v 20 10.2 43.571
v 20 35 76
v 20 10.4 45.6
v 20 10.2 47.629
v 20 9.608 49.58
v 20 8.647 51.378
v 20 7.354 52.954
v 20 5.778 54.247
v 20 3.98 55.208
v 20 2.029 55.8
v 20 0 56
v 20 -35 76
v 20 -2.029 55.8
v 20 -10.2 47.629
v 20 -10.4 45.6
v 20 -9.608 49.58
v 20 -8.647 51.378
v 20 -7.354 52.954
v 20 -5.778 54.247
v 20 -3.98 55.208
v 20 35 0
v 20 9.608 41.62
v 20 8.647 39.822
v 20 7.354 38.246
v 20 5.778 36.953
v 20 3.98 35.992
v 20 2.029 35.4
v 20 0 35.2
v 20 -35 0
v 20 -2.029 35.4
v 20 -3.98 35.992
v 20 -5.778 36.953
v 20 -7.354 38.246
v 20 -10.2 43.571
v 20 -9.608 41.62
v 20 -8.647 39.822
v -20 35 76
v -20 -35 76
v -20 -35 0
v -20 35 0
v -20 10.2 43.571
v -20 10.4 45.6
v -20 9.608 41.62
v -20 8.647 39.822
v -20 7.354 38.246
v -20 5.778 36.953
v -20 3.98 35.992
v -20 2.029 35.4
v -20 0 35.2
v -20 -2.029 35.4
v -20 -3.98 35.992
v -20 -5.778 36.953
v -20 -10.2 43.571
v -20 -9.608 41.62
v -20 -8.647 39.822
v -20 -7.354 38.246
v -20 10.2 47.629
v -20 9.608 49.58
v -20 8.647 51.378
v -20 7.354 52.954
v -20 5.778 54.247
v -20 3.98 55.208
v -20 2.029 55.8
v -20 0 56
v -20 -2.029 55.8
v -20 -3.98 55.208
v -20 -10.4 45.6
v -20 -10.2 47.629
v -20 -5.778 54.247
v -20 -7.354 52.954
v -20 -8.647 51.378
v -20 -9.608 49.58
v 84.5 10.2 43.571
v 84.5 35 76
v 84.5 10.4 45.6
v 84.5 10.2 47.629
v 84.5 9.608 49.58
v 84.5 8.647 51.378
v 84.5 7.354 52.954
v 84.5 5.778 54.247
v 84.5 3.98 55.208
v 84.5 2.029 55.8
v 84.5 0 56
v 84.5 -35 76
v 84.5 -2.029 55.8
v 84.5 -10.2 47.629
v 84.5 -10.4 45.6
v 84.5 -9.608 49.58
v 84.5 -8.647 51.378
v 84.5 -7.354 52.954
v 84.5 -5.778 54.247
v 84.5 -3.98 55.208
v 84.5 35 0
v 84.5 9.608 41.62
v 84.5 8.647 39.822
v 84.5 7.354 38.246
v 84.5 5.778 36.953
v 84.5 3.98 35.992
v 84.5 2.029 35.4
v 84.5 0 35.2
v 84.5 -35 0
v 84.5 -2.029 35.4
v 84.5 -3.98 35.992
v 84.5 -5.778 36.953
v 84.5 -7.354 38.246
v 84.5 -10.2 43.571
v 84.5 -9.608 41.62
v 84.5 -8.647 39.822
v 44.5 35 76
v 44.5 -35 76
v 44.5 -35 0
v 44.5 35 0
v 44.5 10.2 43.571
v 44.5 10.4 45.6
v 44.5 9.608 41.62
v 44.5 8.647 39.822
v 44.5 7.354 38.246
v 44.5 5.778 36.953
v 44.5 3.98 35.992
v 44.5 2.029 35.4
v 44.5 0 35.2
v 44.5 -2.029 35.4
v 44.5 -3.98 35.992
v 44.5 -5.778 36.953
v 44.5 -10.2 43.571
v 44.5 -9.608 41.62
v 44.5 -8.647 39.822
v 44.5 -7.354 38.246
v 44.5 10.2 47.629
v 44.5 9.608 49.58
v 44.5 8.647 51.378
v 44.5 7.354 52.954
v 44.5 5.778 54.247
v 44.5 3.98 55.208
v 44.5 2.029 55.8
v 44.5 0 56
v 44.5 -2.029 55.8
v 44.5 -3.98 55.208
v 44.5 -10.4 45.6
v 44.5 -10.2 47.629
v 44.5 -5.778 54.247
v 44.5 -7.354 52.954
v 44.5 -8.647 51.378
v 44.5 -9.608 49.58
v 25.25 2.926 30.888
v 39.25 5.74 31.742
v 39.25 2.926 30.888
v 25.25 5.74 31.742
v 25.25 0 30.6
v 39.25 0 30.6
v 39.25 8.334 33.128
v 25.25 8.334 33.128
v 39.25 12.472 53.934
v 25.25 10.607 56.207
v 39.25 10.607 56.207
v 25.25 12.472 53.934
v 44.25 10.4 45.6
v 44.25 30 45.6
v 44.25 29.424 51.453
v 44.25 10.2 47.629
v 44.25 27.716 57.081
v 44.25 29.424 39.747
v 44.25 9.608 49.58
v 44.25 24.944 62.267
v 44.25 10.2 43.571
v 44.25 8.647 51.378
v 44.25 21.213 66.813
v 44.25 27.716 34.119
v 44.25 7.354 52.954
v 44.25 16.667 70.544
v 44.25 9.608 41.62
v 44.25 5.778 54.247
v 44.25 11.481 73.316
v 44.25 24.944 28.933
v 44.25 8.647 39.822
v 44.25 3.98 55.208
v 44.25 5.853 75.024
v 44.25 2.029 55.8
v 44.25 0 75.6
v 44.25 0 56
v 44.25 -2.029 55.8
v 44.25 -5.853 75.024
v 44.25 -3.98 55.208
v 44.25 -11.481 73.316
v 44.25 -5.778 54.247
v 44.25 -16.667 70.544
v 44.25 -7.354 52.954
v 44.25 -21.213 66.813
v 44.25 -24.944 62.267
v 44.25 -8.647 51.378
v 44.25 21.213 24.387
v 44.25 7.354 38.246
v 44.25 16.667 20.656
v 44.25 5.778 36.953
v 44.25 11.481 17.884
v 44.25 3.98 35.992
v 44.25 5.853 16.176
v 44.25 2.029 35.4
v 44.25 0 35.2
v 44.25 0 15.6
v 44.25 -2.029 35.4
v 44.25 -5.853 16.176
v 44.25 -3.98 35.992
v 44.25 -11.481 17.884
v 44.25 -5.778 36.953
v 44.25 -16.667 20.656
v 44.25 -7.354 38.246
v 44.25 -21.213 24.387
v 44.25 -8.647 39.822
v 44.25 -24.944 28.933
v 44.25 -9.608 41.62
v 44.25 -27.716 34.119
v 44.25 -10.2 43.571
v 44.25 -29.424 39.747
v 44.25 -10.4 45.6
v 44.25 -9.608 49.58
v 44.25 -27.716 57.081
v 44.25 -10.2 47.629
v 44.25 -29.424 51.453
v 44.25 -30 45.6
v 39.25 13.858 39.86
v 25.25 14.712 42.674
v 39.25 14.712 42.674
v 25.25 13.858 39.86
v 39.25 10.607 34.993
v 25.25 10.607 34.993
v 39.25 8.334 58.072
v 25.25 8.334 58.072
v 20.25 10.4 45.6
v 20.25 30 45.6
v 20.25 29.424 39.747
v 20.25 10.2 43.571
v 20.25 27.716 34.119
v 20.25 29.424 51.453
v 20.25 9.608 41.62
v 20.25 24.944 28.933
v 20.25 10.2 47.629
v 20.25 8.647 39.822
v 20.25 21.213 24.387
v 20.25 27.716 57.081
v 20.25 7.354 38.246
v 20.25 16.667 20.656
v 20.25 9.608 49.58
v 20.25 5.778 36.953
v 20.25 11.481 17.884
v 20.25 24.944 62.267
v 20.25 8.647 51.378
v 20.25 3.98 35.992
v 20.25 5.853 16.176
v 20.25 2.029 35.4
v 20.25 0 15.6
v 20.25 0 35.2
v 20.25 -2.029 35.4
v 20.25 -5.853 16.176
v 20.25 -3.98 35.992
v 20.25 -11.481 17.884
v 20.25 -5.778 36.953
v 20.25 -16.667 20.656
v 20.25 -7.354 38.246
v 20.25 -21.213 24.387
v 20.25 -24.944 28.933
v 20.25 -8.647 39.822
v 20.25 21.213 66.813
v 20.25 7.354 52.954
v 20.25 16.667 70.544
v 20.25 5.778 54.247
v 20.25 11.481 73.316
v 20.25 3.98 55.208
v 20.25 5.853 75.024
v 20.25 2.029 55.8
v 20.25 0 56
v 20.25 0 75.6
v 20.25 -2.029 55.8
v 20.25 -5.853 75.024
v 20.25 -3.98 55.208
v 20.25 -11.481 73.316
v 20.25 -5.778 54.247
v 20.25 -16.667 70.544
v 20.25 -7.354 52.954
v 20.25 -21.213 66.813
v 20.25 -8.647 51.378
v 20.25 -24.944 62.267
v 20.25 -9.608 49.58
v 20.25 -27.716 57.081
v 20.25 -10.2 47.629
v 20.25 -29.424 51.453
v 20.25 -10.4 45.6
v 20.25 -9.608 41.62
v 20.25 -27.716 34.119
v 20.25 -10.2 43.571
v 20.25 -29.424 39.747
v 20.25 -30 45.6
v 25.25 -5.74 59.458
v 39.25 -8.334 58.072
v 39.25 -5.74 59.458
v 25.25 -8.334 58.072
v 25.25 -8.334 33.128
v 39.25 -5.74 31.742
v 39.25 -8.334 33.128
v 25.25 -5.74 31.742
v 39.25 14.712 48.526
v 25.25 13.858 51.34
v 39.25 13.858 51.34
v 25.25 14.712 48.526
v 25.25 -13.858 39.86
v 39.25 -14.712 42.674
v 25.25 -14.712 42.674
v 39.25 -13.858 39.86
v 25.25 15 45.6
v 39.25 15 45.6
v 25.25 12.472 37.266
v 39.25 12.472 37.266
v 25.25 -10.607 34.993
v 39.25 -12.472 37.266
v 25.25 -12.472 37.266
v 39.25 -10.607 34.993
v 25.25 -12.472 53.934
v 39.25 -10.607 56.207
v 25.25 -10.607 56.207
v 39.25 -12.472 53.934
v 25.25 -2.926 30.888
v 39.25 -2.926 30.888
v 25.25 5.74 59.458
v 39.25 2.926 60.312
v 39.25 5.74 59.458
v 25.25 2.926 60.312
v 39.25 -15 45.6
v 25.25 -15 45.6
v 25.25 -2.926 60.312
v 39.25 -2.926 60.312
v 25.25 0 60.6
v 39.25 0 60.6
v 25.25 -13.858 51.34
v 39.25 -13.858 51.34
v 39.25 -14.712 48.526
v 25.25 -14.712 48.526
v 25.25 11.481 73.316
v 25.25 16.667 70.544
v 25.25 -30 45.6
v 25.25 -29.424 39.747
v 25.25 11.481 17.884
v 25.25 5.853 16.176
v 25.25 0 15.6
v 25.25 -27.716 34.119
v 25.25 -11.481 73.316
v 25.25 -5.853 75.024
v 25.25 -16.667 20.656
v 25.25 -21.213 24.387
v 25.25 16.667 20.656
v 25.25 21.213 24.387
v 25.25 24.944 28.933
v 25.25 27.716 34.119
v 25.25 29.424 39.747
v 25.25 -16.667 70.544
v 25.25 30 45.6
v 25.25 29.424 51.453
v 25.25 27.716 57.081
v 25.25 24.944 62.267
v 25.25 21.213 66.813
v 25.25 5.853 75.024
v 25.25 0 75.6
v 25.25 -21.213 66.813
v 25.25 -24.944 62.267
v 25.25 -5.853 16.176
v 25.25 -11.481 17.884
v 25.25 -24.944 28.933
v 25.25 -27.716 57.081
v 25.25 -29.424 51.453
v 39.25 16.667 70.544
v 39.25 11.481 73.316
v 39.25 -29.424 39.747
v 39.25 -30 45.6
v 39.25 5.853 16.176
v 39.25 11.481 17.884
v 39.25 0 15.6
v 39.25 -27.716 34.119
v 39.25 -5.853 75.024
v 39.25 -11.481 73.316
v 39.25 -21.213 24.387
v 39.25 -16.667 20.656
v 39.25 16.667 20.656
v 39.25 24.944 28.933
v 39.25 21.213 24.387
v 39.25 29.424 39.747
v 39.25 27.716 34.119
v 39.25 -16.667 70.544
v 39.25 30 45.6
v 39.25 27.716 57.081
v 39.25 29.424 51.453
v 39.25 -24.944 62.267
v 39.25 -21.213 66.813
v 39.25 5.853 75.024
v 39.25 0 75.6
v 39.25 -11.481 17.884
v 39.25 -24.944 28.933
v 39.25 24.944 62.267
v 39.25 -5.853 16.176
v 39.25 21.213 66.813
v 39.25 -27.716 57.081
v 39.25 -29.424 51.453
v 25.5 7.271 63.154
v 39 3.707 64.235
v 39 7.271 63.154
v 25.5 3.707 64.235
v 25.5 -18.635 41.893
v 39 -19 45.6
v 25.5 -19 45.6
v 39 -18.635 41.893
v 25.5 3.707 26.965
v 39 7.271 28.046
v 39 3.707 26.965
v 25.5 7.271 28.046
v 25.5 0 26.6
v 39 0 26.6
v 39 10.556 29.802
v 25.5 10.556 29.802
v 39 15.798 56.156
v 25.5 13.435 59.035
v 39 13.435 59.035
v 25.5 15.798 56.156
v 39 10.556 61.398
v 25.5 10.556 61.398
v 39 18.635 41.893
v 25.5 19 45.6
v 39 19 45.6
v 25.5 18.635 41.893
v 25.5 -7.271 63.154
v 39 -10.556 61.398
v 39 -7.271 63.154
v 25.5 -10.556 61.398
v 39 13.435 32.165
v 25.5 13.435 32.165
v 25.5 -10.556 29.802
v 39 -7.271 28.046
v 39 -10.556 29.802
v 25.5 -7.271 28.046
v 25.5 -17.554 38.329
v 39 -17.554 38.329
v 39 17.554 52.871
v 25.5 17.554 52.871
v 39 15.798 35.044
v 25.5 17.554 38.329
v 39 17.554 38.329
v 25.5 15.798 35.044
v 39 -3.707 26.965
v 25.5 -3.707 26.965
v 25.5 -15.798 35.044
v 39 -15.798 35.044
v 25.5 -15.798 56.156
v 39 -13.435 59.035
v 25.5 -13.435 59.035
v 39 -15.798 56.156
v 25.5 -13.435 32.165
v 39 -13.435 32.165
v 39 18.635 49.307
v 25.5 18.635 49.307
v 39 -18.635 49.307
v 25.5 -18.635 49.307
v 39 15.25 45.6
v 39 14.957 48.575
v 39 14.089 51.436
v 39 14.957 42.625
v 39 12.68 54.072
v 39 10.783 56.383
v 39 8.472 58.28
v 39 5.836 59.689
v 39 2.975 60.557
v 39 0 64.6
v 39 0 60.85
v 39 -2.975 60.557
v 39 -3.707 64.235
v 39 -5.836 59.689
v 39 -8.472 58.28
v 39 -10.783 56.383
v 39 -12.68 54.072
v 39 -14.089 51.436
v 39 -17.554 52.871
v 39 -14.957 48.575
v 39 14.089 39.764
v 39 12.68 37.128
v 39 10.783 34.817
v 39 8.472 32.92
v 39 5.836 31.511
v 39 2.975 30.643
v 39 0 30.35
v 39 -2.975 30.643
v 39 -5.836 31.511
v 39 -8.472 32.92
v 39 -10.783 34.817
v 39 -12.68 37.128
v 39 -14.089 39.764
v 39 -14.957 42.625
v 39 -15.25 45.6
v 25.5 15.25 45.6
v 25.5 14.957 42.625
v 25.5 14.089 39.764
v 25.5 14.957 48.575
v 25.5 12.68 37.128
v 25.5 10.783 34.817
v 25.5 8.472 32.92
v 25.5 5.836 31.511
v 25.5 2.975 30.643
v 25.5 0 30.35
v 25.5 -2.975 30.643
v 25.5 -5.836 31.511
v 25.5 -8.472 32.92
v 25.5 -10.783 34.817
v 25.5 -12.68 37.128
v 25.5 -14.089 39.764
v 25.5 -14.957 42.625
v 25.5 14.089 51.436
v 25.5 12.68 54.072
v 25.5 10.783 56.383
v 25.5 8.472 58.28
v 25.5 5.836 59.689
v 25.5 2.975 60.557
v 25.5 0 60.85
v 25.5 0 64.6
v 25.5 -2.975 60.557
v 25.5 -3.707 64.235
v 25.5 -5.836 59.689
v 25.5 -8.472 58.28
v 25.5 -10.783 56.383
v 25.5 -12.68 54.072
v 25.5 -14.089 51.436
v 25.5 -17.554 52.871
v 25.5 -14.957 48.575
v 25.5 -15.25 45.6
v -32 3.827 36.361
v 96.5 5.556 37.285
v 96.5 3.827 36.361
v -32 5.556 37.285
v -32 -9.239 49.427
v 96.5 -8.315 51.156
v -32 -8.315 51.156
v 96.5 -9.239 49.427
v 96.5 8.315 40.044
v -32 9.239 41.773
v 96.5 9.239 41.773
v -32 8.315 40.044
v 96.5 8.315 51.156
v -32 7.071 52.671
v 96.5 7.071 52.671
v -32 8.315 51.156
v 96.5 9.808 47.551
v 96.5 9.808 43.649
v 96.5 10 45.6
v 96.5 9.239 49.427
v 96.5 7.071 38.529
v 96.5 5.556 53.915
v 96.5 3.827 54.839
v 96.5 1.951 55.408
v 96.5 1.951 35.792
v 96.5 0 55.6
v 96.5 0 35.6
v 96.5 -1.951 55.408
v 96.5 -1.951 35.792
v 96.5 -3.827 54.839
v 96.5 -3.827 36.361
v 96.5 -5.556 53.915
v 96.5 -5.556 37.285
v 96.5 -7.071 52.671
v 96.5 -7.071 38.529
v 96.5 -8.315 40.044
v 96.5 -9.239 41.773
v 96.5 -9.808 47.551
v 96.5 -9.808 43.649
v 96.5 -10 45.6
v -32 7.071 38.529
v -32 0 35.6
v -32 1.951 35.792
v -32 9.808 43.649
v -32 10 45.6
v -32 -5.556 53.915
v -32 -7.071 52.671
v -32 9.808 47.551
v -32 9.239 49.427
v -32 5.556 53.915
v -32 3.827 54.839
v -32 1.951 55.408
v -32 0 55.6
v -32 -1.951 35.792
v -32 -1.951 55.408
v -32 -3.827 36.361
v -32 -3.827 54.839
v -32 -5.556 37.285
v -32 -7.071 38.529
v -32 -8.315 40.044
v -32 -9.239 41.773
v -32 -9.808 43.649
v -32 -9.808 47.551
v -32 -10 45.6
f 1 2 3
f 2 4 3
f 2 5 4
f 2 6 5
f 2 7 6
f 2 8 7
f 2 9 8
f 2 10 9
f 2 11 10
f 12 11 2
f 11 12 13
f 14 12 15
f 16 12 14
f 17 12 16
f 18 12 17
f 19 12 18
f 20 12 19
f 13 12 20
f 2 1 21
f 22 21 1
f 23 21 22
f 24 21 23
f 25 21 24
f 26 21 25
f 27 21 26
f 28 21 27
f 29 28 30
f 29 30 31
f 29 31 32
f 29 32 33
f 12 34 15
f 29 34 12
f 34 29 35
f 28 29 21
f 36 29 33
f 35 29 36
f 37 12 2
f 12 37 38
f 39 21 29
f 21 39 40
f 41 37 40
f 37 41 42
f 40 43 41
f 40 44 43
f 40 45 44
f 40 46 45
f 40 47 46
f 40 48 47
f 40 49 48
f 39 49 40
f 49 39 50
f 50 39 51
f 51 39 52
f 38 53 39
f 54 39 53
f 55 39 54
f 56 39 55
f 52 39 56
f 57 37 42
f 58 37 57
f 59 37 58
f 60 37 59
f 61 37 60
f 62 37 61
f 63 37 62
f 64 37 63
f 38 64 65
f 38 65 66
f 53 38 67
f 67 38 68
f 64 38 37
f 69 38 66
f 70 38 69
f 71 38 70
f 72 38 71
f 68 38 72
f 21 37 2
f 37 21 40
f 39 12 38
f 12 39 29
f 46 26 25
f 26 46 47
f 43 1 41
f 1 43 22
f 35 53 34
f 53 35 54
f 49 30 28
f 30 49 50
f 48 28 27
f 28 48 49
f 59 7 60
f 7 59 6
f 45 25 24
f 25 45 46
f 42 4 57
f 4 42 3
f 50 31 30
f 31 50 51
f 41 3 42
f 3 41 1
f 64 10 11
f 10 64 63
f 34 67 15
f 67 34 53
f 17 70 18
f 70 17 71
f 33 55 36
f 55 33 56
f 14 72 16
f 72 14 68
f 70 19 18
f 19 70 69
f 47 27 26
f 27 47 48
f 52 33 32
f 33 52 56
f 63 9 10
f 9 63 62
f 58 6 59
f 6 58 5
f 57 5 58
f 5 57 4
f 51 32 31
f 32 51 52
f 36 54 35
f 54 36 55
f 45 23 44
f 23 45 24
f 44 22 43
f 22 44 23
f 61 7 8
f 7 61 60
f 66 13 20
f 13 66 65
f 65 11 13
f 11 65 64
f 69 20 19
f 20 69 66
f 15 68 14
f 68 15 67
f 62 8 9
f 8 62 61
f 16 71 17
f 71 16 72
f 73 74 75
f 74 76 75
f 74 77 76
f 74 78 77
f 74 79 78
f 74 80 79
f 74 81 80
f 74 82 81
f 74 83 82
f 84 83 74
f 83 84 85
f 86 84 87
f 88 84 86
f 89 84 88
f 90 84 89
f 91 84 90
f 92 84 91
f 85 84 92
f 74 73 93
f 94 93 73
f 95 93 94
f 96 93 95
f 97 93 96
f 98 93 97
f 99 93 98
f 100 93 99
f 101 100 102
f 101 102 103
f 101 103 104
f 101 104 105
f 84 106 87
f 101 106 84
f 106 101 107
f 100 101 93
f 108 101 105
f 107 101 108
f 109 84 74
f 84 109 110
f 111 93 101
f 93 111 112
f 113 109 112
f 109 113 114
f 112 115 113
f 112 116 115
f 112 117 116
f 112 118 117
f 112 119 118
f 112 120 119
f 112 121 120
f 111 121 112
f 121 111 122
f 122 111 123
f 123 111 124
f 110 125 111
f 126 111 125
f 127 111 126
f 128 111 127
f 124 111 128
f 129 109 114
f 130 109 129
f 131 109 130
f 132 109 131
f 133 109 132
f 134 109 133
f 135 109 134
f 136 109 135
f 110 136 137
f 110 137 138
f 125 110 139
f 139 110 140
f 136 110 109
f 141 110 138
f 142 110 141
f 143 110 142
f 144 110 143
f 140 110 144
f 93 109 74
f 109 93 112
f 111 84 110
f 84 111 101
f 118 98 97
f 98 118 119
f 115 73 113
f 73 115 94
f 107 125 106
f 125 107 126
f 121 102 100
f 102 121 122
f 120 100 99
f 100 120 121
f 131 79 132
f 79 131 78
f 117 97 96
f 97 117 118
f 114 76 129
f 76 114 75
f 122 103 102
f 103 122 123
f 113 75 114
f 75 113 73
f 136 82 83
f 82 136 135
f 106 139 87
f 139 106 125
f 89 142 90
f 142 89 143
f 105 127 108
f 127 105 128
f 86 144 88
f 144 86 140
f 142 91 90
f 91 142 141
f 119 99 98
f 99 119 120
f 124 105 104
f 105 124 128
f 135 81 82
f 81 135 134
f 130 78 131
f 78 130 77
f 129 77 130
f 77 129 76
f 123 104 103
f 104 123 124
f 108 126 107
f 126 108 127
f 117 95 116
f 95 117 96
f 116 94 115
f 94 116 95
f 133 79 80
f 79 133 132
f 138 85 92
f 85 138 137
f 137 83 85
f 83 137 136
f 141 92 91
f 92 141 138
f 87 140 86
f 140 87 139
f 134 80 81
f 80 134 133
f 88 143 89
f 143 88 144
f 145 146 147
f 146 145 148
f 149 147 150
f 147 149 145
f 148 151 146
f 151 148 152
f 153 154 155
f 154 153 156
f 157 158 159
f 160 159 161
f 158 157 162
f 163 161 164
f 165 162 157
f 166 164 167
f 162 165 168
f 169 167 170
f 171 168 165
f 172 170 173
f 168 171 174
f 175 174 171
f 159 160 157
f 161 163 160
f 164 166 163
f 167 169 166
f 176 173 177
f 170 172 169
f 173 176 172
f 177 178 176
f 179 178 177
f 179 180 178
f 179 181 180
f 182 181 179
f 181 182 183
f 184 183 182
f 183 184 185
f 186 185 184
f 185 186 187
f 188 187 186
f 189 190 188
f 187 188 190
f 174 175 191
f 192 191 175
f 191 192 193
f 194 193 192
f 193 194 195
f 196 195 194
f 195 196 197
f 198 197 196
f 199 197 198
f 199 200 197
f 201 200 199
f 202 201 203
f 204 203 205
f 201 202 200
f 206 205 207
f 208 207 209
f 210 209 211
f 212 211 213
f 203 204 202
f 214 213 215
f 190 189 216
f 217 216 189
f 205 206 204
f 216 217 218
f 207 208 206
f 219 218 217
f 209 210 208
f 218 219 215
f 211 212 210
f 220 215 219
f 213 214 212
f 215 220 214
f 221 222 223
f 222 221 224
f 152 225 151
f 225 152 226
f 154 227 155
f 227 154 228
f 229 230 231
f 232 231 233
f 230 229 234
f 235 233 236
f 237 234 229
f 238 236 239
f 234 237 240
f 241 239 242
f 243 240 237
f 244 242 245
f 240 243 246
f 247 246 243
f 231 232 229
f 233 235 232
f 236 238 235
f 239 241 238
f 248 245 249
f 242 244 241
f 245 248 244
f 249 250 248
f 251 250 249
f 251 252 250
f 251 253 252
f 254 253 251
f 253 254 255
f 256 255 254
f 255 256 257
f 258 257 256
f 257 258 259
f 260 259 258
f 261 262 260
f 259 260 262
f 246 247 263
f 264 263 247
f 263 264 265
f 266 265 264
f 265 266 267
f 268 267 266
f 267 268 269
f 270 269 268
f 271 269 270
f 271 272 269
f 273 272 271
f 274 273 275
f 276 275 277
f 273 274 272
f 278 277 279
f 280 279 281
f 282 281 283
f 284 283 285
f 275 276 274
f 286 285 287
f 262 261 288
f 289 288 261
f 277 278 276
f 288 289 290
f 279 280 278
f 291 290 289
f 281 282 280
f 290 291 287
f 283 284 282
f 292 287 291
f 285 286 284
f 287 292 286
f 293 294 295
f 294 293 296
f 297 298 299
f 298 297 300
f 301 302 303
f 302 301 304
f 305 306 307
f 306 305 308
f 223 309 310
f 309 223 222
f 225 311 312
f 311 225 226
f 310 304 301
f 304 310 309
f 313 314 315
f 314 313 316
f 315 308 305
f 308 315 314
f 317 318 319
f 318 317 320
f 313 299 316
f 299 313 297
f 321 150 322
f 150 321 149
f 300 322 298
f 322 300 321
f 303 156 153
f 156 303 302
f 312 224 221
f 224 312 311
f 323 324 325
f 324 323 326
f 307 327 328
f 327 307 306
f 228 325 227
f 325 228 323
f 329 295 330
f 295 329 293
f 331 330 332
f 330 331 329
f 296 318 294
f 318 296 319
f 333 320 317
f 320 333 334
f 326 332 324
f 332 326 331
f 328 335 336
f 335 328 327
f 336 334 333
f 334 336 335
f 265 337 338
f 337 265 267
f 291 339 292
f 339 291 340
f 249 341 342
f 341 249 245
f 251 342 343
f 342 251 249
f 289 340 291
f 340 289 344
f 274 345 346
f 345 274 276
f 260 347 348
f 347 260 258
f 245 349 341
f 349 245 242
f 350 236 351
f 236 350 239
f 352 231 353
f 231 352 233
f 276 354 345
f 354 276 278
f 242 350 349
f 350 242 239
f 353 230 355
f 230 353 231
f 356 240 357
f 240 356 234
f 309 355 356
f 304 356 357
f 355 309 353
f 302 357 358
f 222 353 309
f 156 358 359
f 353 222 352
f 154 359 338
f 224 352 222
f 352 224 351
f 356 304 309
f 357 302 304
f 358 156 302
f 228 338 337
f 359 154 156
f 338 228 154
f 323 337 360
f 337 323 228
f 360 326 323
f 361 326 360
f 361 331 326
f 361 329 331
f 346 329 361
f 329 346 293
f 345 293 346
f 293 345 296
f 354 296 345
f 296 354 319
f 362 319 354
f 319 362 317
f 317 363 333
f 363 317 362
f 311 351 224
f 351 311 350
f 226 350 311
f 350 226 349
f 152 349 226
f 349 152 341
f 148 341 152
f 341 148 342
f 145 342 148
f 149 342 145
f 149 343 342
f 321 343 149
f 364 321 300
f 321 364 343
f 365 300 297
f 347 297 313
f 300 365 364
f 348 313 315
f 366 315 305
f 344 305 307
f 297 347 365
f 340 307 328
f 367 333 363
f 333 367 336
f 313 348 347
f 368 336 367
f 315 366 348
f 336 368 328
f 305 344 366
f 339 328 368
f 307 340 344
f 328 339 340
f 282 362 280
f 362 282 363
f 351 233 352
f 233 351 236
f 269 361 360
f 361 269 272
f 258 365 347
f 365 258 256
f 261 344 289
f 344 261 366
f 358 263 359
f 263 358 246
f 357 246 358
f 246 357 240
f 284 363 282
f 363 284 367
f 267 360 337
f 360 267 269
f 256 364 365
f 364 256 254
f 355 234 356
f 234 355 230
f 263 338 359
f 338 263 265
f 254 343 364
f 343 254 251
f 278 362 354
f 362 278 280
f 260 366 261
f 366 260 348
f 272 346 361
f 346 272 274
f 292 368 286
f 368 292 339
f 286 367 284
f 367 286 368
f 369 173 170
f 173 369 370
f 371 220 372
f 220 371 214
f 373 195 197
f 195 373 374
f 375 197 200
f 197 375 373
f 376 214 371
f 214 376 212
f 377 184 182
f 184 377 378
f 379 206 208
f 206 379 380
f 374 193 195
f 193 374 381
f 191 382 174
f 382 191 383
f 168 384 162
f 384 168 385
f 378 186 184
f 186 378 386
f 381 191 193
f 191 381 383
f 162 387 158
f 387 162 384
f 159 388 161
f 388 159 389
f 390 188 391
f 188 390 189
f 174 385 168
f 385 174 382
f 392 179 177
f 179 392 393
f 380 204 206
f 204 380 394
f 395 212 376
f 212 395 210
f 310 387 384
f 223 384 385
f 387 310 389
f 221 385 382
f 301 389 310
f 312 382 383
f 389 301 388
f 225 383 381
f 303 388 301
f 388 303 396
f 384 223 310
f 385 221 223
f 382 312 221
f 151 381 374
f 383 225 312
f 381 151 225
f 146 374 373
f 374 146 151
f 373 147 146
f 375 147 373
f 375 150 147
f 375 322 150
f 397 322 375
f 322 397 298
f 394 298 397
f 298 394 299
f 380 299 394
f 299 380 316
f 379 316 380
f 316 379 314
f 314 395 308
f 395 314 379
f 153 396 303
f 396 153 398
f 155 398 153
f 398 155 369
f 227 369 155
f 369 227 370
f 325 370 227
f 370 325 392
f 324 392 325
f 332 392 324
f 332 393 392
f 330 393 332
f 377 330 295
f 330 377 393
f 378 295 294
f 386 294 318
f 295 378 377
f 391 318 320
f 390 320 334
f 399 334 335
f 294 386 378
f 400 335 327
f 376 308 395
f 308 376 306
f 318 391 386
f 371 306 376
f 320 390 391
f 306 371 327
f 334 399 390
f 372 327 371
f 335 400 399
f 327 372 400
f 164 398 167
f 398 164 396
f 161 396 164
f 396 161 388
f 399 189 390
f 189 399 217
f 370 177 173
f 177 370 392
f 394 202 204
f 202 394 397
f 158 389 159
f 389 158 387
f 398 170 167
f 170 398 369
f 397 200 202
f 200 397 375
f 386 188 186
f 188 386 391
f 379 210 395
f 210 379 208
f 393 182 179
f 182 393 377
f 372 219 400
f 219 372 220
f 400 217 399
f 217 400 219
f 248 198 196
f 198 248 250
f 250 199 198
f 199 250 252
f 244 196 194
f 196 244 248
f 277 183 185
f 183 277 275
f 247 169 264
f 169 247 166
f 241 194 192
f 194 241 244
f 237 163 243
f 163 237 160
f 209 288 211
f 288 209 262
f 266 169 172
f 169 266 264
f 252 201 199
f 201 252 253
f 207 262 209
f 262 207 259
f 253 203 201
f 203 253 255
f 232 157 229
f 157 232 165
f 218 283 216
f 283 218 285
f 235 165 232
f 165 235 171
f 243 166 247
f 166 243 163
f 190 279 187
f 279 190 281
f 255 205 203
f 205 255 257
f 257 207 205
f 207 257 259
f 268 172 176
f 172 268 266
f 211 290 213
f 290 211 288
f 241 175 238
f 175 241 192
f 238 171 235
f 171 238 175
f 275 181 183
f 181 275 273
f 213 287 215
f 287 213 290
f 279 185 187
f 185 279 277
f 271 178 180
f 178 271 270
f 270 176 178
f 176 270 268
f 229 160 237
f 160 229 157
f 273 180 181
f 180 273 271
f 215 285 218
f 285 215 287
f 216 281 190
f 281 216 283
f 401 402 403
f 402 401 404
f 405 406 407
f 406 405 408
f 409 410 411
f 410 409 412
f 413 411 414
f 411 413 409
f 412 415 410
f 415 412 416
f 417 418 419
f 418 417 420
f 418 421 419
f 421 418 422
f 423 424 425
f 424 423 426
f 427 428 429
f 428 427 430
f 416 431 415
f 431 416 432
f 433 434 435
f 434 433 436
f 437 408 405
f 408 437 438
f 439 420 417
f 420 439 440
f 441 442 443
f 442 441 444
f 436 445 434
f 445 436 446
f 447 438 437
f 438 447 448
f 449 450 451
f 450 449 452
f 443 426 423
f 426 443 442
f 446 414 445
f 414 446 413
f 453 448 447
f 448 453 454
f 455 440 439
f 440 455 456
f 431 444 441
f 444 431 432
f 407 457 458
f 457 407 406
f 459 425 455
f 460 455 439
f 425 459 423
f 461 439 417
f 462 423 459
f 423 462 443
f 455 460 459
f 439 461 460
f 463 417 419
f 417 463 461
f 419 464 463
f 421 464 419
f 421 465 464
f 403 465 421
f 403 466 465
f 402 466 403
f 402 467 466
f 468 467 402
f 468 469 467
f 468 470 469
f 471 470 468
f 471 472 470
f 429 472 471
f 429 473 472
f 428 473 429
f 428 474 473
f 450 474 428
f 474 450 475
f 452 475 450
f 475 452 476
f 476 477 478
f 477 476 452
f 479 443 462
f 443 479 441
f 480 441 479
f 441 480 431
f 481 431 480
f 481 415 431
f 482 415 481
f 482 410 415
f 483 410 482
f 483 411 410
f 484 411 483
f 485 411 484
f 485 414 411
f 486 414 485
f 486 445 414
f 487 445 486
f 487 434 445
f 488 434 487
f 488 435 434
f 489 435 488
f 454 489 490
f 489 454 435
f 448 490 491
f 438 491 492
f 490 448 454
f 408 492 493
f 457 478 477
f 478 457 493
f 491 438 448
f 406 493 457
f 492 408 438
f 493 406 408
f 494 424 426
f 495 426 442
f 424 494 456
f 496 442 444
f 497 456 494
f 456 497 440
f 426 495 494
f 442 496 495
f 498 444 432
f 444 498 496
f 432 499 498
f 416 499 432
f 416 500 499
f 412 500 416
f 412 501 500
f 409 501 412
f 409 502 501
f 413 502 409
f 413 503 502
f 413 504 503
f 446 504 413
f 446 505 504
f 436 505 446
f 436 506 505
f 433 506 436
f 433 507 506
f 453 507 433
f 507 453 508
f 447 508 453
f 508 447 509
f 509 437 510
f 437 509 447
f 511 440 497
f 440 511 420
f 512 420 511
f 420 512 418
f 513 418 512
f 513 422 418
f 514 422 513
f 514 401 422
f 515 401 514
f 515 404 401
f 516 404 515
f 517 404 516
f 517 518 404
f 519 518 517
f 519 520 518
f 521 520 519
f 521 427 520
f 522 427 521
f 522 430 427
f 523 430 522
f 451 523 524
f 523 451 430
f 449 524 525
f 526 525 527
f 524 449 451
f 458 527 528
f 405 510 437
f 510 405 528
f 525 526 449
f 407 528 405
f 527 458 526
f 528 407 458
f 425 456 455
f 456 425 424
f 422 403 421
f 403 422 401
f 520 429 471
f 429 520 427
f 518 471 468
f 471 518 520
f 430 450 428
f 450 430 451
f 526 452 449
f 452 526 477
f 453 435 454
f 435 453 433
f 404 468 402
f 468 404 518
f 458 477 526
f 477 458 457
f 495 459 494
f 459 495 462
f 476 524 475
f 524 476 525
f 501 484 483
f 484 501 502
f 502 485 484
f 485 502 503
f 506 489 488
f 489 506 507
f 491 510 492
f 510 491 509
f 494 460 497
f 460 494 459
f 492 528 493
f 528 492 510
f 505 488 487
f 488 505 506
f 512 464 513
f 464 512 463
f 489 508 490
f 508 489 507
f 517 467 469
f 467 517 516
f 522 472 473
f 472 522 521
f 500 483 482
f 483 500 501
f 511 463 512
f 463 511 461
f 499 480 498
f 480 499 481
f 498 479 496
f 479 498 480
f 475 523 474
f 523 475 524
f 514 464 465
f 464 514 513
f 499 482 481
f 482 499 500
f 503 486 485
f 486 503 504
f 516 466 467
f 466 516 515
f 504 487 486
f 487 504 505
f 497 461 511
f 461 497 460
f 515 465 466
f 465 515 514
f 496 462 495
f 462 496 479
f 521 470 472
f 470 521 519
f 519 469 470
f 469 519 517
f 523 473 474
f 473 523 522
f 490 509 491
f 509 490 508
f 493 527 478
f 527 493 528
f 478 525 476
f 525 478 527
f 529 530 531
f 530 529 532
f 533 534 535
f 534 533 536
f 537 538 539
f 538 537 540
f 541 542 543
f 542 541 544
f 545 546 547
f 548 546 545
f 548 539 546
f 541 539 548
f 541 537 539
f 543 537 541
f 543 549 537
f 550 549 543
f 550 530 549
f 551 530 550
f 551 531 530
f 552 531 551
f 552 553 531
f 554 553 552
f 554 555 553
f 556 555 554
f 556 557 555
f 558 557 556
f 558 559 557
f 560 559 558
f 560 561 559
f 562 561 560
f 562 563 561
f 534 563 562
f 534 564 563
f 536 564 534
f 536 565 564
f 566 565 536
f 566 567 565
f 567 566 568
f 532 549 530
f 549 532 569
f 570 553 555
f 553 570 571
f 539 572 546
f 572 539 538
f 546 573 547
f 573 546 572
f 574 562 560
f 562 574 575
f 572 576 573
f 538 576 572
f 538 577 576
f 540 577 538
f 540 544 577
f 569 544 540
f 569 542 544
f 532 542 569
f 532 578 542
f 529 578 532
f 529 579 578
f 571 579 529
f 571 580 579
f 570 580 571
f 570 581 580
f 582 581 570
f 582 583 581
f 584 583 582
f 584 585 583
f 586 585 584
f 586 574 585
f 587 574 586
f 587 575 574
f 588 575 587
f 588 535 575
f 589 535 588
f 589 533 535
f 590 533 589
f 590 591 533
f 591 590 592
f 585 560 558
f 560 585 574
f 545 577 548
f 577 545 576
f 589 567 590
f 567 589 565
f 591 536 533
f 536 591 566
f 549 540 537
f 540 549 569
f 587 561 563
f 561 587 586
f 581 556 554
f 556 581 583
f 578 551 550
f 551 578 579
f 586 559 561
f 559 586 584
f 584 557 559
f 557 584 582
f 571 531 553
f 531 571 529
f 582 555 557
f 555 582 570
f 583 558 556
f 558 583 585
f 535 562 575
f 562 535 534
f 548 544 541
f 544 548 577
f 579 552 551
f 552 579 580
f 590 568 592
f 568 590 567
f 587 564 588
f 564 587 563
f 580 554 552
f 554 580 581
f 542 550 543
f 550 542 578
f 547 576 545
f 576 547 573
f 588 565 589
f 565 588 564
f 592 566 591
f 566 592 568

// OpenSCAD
$fn = 32;

// ------------------------------------------------------------------------
// Pulley assembly: d60 pulley with a belt, shaft d20
// Every part is its own module, assembly() places them once.
// ------------------------------------------------------------------------

// --- part 1 ---
module support1() {
  difference() {
    translate([-20, -35, 0]) cube([40, 70, 76]);
    translate([0, 0, 45.6]) rotate([0, 90, 0]) cylinder(h = 42, d = 20.8, center = true);
  }
}

// --- part 2 ---
module support2() {
  difference() {
    translate([-20, -35, 0]) cube([40, 70, 76]);
    translate([0, 0, 45.6]) rotate([0, 90, 0]) cylinder(h = 42, d = 20.8, center = true);
  }
}

// --- part 3 ---
module shaft() {
  translate([0, 0, -64.25]) cylinder(h = 128.5, d = 20);
}

// --- part 4 ---
module pulley() {
  difference() {
    union() {
      cylinder(h = 24, d = 30);
      cylinder(h = 5, d = 60);
      translate([0, 0, 19]) cylinder(h = 5, d = 60);
    }
    translate([0, 0, -1]) cylinder(h = 26, d = 20.8);
  }
}

// --- part 5 ---
module belt() {
  difference() {
      translate([0, 0, 0]) cylinder(h = 13.5, d = 38);
      translate([0, 0, -1]) cylinder(h = 15.5, d = 30.5);
    }
}

// --- assembly ---
module assembly() {
  translate([0, 0, 0]) rotate([0, 0, 0]) support1();
  translate([64.5, 0, 0]) rotate([0, 0, 0]) support2();
  translate([32.25, 0, 45.6]) rotate([0, 90, 0]) shaft();
  translate([20.25, 0, 45.6]) rotate([0, 90, 0]) pulley();
  translate([25.5, 0, 45.6]) rotate([0, 90, 0]) belt();
}

assembly();
